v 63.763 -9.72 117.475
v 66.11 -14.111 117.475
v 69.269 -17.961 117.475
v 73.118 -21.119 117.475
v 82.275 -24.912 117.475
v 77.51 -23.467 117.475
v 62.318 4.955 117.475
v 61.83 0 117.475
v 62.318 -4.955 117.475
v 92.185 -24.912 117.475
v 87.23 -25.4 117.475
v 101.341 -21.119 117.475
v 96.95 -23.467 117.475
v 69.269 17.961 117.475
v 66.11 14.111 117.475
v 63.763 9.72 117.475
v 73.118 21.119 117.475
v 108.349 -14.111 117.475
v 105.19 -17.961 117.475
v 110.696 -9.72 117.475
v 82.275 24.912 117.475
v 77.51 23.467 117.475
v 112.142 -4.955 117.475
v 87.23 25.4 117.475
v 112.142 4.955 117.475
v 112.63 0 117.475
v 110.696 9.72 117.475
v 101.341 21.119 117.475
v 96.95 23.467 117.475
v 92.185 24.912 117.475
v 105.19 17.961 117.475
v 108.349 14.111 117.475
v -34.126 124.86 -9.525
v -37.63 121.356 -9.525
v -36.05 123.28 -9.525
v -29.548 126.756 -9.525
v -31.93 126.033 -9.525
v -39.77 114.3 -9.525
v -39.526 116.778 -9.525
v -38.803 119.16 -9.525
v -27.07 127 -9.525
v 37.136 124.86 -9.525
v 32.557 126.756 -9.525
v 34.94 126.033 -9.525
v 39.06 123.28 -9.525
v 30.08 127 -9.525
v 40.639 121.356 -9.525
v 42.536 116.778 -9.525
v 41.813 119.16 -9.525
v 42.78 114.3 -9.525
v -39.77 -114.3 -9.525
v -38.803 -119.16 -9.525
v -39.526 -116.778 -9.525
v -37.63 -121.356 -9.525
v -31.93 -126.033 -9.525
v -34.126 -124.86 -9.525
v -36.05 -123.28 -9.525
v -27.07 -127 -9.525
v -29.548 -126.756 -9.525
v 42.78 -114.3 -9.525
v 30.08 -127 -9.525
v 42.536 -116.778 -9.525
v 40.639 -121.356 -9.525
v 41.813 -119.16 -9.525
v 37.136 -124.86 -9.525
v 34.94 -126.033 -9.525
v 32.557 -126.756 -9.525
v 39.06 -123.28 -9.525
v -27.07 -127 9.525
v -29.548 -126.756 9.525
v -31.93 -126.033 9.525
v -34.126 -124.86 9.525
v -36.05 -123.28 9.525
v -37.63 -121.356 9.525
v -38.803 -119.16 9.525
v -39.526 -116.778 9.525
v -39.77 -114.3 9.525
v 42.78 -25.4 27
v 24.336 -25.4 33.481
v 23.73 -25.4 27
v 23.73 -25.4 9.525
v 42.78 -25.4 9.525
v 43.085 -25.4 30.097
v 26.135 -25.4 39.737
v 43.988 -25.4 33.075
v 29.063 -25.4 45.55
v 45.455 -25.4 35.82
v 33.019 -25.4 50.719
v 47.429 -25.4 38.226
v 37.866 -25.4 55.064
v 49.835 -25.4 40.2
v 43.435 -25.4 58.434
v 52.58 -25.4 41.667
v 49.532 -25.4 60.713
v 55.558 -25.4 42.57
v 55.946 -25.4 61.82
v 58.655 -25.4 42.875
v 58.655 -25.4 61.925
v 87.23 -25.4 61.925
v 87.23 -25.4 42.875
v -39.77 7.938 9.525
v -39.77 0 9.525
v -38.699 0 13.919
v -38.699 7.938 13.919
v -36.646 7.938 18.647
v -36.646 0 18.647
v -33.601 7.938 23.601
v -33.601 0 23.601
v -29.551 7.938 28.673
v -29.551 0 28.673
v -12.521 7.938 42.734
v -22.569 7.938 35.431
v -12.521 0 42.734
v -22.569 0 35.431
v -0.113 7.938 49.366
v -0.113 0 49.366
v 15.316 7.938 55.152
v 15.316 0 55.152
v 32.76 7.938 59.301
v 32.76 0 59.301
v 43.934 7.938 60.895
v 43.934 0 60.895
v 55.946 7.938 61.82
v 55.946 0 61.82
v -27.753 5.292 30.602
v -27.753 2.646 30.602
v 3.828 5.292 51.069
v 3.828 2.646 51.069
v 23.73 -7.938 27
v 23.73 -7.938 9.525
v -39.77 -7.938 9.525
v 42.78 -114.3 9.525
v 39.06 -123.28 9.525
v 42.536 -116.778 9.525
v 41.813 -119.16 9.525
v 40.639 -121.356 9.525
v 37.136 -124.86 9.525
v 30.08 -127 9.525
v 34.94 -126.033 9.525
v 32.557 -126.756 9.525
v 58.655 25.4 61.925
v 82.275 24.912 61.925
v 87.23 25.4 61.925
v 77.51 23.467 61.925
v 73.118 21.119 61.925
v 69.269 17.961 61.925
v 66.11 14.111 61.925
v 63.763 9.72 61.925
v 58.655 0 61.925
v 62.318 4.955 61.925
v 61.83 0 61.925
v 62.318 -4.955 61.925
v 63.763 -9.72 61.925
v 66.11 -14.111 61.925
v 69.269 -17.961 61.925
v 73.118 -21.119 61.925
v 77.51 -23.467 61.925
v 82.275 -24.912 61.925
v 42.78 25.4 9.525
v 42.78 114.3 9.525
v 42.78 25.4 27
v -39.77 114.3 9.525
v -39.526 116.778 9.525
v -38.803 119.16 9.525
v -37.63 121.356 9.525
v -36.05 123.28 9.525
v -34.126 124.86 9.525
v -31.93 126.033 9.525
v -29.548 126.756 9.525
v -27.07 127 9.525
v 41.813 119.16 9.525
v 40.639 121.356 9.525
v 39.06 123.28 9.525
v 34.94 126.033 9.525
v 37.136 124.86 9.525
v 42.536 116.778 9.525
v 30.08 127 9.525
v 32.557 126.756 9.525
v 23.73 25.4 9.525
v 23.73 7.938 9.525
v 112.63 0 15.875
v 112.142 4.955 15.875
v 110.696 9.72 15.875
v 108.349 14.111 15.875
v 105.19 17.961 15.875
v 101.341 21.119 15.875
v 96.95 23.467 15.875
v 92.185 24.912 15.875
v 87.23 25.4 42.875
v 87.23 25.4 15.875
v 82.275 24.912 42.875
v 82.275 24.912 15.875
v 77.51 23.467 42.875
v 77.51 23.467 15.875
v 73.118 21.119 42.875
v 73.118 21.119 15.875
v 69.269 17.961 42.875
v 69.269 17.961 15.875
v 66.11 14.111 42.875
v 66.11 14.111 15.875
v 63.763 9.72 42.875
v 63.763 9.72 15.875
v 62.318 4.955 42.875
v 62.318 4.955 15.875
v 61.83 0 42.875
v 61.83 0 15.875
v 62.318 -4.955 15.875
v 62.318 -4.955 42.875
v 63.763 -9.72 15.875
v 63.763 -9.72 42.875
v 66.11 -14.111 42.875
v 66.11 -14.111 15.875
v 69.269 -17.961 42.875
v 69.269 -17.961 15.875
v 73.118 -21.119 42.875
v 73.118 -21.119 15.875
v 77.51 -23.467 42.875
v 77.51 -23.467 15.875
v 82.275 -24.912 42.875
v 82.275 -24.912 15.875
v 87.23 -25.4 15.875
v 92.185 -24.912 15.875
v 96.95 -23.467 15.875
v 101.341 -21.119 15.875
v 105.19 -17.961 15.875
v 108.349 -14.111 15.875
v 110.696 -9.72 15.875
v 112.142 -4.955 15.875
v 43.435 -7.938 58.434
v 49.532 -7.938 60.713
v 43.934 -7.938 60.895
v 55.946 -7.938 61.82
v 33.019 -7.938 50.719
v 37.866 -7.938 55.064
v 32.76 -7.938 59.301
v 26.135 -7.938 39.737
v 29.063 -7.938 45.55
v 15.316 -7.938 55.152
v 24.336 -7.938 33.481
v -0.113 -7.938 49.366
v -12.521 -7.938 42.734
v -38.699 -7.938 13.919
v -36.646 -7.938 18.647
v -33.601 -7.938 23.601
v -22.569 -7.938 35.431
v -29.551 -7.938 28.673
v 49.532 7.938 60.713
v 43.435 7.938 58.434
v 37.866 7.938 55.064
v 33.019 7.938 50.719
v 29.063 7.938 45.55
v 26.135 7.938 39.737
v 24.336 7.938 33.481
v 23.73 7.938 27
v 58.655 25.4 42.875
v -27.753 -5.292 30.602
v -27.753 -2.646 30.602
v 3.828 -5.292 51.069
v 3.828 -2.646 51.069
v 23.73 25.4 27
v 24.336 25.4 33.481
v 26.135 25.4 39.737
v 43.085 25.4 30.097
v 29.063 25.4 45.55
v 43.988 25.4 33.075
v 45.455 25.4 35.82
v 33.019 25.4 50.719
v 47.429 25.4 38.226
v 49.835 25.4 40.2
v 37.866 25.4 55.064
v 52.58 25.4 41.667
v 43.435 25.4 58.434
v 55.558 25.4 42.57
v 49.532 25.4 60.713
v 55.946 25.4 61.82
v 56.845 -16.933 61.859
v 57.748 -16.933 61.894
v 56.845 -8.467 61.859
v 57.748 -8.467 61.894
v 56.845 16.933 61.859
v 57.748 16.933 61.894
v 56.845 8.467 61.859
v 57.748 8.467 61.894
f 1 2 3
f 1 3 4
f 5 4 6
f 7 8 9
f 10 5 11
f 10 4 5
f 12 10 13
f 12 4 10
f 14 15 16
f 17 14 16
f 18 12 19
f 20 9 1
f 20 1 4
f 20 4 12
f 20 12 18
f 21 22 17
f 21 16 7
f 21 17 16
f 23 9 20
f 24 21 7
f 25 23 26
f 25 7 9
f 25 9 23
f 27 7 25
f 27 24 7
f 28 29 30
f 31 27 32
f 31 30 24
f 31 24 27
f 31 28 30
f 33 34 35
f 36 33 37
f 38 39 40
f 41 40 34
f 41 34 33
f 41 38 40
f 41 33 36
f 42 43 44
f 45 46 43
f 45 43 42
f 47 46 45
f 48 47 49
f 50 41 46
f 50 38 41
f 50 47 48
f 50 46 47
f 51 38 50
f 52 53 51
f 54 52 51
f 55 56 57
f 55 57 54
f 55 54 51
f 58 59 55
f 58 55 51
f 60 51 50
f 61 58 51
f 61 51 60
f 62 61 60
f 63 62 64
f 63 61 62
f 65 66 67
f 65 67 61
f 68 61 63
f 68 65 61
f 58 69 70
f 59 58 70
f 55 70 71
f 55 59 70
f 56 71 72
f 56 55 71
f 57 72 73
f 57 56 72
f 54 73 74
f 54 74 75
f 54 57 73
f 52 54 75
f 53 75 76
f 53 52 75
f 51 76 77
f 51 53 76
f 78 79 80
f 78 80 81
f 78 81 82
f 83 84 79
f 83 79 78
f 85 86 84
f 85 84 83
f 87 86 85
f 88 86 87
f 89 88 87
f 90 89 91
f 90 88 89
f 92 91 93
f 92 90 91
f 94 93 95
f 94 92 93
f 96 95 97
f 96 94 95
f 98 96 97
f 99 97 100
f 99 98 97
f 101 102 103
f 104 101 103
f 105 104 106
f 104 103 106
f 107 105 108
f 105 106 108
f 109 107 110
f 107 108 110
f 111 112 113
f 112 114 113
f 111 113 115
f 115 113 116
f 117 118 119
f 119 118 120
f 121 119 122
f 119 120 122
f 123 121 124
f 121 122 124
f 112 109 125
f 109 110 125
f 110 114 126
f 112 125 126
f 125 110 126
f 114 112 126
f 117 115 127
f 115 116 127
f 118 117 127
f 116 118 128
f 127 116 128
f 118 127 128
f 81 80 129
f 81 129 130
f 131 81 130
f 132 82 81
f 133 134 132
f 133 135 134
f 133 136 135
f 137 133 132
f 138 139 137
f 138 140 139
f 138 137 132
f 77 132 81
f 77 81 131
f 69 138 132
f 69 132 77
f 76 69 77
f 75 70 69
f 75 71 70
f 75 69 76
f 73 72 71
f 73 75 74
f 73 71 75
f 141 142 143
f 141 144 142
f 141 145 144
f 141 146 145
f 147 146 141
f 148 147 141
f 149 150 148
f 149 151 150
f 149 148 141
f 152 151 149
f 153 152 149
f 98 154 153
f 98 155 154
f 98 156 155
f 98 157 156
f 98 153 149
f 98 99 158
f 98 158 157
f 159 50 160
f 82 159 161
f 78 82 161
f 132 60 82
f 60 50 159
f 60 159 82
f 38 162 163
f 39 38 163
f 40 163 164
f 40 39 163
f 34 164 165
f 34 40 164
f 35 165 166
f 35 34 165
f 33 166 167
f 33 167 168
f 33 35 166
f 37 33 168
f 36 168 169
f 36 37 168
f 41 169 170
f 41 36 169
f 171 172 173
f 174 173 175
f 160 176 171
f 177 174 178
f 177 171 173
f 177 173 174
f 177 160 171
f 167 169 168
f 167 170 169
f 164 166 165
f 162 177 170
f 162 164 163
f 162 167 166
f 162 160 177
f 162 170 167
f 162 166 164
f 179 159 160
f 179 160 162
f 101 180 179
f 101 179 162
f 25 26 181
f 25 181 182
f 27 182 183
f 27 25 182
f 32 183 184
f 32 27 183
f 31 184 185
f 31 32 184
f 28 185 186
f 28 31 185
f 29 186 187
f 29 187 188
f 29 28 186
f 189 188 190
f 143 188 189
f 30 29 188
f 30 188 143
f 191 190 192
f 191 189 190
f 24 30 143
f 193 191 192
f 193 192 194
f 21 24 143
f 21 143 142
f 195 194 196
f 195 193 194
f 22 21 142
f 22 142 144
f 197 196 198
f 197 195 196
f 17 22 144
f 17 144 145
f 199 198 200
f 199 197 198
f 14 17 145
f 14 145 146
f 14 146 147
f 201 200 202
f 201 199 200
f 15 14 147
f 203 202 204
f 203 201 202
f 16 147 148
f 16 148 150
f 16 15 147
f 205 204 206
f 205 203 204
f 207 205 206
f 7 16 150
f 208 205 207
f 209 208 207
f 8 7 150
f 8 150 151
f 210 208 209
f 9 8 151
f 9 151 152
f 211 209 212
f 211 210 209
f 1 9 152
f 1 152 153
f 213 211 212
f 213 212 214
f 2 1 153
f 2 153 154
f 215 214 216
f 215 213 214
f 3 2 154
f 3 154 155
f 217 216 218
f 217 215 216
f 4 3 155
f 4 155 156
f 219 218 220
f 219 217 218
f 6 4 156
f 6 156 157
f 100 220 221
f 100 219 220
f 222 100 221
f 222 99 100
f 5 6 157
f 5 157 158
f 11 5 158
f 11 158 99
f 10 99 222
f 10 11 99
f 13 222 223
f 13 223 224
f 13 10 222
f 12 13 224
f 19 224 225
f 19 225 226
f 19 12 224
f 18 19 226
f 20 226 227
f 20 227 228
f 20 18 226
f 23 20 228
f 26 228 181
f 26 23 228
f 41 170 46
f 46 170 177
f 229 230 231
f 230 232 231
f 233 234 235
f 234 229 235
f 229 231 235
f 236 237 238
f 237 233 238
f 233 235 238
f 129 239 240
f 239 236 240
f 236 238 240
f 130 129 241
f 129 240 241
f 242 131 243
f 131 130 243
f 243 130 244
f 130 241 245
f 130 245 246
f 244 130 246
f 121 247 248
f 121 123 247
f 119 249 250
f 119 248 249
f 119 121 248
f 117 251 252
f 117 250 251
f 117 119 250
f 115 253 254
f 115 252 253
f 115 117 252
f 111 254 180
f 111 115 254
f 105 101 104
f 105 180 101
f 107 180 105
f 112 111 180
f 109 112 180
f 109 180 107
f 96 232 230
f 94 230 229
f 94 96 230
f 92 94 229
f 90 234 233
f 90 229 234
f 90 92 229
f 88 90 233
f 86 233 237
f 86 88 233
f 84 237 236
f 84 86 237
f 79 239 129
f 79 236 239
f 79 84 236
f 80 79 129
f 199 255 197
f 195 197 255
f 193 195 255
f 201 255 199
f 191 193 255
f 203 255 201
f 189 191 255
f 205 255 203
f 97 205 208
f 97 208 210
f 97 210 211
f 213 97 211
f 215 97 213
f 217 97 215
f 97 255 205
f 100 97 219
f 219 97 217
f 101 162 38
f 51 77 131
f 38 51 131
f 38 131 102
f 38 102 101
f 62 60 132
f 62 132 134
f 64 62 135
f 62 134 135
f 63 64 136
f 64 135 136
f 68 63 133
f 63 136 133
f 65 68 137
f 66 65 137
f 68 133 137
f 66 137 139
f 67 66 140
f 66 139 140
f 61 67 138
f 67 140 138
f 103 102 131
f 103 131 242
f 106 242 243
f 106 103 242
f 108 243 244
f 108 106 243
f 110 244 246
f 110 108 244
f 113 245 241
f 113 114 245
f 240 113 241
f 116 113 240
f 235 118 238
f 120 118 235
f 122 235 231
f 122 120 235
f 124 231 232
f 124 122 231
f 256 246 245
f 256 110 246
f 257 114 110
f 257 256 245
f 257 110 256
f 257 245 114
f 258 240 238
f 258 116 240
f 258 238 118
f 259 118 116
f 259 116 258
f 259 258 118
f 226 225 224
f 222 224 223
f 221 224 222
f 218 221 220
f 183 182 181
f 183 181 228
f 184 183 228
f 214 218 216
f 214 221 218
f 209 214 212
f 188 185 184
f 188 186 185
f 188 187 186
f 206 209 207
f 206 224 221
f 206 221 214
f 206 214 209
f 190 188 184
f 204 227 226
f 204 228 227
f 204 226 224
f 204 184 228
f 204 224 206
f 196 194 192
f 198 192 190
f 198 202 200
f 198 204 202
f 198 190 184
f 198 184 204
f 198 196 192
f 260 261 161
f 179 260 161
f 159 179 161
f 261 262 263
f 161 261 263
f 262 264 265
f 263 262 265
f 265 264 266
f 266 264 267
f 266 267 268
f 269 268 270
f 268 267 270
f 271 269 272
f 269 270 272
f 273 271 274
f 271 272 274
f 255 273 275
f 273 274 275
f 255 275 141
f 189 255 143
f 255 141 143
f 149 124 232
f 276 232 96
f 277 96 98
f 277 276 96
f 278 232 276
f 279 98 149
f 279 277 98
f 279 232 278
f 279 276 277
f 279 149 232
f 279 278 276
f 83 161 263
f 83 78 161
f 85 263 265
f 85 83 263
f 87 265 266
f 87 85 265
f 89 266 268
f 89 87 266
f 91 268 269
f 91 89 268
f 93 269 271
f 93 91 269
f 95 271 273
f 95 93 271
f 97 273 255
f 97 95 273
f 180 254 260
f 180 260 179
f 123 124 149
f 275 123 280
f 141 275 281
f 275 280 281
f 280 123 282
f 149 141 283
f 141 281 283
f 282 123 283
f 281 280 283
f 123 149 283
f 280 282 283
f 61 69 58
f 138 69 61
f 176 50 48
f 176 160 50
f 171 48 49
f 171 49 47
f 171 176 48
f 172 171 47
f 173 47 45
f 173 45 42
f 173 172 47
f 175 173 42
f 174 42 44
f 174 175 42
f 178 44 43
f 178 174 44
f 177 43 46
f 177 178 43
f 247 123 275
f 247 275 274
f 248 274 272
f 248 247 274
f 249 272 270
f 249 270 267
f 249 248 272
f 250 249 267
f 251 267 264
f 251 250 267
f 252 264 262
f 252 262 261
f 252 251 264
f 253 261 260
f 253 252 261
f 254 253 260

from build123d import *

# Parameters (mm, degrees)
F1_DEPTH = 127
F0_W     = 25.4
F0_H     = 19.05
F2_DEPTH = 25.4
F3_DEPTH = 7.9375
F5_R     = 12.7


with BuildPart() as f1:
    # F0 (on Front) → F1 (new body, symmetric)
    with BuildSketch(Plane.XZ):
        Polygon((23.7298189036, 9.525), (-39.7701810964, 9.525), (-39.7701810964, -9.525), (42.7798189036, -9.525), (42.7798189036, 9.525), align=None)
    extrude(amount=F1_DEPTH, both=True)

    # F0 (on Front) → F2 (join, symmetric)
    with BuildSketch(Plane.XZ):
        with Locations((74.5298189036, 52.4002)):
            Rectangle(F0_W, F0_H)
        with BuildLine():
            Line((23.7298189036, 27.0002), (23.7298189036, 9.525))
            Line((23.7298189036, 9.525), (42.7798189036, 9.525))
            Line((42.7798189036, 9.525), (42.7798189036, 27.0002))
            ThreePointArc((42.7798189036, 27.0002), (47.4294987522, 38.2255201513), (58.6548189036, 42.8752))
            Line((58.6548189036, 42.8752), (61.8298189036, 42.8752))
            Line((61.8298189036, 42.8752), (61.8298189036, 61.9252))
            Line((61.8298189036, 61.9252), (58.6548189036, 61.9252))
            add(Edge.make_bspline(
                [(55.9463563883, 61.8200198703), (56.8425826502, 61.8608849379), (57.7453992228, 61.8959848389), (58.6548189036, 61.9252)],
                knots=[109.933459913, 109.933459913, 109.933459913, 109.933459913, 111.5045361635, 111.5045361635, 111.5045361635, 111.5045361635], degree=3))
            ThreePointArc((55.9463563883, 61.8200198703), (33.0194070837, 50.7189960451), (23.7298189036, 27.0002))
        make_face()
    extrude(amount=F2_DEPTH, both=True)

    # F0 (on Front) → F3 (join, symmetric)
    with BuildSketch(Plane.XZ):
        with BuildLine():
            add(Edge.make_bspline(
                [(-39.7701810964, 9.525), (-37.2096076888, 27.8732826741), (-6.7655926965, 58.9605544136), (55.9463563883, 61.8200198703)],
                knots=[0, 0, 0, 0, 109.933459913, 109.933459913, 109.933459913, 109.933459913], degree=3))
            Line((-39.7701810964, 9.525), (23.7298189036, 9.525))
            Line((23.7298189036, 9.525), (23.7298189036, 27.0002))
            ThreePointArc((23.7298189036, 27.0002), (33.0194070837, 50.7189960451), (55.9463563883, 61.8200198703))
        make_face()
    extrude(amount=F3_DEPTH, both=True)

    # F0 (on Front) → F4 (revolve)
    with BuildSketch(Plane.XZ):
        Polygon((87.2298189036, 117.475), (87.2298189036, 61.9252), (87.2298189036, 42.8752), (87.2298189036, 15.875), (112.6298189036, 15.875), (112.6298189036, 117.475), align=None)
    revolve(axis=Axis((87.2298189036, 0, 66.675), (0, 0, 1)))

    # F5
    f5_edges = [f1.edges().sort_by_distance(p)[0] for p in [
        (-39.770181, -127, 0),
        (42.779819, -127, 0),
        (42.779819, 127, 0),
        (-39.770181, 127, 0),
    ]]
    fillet(f5_edges, radius=F5_R)


solid = f1.part
